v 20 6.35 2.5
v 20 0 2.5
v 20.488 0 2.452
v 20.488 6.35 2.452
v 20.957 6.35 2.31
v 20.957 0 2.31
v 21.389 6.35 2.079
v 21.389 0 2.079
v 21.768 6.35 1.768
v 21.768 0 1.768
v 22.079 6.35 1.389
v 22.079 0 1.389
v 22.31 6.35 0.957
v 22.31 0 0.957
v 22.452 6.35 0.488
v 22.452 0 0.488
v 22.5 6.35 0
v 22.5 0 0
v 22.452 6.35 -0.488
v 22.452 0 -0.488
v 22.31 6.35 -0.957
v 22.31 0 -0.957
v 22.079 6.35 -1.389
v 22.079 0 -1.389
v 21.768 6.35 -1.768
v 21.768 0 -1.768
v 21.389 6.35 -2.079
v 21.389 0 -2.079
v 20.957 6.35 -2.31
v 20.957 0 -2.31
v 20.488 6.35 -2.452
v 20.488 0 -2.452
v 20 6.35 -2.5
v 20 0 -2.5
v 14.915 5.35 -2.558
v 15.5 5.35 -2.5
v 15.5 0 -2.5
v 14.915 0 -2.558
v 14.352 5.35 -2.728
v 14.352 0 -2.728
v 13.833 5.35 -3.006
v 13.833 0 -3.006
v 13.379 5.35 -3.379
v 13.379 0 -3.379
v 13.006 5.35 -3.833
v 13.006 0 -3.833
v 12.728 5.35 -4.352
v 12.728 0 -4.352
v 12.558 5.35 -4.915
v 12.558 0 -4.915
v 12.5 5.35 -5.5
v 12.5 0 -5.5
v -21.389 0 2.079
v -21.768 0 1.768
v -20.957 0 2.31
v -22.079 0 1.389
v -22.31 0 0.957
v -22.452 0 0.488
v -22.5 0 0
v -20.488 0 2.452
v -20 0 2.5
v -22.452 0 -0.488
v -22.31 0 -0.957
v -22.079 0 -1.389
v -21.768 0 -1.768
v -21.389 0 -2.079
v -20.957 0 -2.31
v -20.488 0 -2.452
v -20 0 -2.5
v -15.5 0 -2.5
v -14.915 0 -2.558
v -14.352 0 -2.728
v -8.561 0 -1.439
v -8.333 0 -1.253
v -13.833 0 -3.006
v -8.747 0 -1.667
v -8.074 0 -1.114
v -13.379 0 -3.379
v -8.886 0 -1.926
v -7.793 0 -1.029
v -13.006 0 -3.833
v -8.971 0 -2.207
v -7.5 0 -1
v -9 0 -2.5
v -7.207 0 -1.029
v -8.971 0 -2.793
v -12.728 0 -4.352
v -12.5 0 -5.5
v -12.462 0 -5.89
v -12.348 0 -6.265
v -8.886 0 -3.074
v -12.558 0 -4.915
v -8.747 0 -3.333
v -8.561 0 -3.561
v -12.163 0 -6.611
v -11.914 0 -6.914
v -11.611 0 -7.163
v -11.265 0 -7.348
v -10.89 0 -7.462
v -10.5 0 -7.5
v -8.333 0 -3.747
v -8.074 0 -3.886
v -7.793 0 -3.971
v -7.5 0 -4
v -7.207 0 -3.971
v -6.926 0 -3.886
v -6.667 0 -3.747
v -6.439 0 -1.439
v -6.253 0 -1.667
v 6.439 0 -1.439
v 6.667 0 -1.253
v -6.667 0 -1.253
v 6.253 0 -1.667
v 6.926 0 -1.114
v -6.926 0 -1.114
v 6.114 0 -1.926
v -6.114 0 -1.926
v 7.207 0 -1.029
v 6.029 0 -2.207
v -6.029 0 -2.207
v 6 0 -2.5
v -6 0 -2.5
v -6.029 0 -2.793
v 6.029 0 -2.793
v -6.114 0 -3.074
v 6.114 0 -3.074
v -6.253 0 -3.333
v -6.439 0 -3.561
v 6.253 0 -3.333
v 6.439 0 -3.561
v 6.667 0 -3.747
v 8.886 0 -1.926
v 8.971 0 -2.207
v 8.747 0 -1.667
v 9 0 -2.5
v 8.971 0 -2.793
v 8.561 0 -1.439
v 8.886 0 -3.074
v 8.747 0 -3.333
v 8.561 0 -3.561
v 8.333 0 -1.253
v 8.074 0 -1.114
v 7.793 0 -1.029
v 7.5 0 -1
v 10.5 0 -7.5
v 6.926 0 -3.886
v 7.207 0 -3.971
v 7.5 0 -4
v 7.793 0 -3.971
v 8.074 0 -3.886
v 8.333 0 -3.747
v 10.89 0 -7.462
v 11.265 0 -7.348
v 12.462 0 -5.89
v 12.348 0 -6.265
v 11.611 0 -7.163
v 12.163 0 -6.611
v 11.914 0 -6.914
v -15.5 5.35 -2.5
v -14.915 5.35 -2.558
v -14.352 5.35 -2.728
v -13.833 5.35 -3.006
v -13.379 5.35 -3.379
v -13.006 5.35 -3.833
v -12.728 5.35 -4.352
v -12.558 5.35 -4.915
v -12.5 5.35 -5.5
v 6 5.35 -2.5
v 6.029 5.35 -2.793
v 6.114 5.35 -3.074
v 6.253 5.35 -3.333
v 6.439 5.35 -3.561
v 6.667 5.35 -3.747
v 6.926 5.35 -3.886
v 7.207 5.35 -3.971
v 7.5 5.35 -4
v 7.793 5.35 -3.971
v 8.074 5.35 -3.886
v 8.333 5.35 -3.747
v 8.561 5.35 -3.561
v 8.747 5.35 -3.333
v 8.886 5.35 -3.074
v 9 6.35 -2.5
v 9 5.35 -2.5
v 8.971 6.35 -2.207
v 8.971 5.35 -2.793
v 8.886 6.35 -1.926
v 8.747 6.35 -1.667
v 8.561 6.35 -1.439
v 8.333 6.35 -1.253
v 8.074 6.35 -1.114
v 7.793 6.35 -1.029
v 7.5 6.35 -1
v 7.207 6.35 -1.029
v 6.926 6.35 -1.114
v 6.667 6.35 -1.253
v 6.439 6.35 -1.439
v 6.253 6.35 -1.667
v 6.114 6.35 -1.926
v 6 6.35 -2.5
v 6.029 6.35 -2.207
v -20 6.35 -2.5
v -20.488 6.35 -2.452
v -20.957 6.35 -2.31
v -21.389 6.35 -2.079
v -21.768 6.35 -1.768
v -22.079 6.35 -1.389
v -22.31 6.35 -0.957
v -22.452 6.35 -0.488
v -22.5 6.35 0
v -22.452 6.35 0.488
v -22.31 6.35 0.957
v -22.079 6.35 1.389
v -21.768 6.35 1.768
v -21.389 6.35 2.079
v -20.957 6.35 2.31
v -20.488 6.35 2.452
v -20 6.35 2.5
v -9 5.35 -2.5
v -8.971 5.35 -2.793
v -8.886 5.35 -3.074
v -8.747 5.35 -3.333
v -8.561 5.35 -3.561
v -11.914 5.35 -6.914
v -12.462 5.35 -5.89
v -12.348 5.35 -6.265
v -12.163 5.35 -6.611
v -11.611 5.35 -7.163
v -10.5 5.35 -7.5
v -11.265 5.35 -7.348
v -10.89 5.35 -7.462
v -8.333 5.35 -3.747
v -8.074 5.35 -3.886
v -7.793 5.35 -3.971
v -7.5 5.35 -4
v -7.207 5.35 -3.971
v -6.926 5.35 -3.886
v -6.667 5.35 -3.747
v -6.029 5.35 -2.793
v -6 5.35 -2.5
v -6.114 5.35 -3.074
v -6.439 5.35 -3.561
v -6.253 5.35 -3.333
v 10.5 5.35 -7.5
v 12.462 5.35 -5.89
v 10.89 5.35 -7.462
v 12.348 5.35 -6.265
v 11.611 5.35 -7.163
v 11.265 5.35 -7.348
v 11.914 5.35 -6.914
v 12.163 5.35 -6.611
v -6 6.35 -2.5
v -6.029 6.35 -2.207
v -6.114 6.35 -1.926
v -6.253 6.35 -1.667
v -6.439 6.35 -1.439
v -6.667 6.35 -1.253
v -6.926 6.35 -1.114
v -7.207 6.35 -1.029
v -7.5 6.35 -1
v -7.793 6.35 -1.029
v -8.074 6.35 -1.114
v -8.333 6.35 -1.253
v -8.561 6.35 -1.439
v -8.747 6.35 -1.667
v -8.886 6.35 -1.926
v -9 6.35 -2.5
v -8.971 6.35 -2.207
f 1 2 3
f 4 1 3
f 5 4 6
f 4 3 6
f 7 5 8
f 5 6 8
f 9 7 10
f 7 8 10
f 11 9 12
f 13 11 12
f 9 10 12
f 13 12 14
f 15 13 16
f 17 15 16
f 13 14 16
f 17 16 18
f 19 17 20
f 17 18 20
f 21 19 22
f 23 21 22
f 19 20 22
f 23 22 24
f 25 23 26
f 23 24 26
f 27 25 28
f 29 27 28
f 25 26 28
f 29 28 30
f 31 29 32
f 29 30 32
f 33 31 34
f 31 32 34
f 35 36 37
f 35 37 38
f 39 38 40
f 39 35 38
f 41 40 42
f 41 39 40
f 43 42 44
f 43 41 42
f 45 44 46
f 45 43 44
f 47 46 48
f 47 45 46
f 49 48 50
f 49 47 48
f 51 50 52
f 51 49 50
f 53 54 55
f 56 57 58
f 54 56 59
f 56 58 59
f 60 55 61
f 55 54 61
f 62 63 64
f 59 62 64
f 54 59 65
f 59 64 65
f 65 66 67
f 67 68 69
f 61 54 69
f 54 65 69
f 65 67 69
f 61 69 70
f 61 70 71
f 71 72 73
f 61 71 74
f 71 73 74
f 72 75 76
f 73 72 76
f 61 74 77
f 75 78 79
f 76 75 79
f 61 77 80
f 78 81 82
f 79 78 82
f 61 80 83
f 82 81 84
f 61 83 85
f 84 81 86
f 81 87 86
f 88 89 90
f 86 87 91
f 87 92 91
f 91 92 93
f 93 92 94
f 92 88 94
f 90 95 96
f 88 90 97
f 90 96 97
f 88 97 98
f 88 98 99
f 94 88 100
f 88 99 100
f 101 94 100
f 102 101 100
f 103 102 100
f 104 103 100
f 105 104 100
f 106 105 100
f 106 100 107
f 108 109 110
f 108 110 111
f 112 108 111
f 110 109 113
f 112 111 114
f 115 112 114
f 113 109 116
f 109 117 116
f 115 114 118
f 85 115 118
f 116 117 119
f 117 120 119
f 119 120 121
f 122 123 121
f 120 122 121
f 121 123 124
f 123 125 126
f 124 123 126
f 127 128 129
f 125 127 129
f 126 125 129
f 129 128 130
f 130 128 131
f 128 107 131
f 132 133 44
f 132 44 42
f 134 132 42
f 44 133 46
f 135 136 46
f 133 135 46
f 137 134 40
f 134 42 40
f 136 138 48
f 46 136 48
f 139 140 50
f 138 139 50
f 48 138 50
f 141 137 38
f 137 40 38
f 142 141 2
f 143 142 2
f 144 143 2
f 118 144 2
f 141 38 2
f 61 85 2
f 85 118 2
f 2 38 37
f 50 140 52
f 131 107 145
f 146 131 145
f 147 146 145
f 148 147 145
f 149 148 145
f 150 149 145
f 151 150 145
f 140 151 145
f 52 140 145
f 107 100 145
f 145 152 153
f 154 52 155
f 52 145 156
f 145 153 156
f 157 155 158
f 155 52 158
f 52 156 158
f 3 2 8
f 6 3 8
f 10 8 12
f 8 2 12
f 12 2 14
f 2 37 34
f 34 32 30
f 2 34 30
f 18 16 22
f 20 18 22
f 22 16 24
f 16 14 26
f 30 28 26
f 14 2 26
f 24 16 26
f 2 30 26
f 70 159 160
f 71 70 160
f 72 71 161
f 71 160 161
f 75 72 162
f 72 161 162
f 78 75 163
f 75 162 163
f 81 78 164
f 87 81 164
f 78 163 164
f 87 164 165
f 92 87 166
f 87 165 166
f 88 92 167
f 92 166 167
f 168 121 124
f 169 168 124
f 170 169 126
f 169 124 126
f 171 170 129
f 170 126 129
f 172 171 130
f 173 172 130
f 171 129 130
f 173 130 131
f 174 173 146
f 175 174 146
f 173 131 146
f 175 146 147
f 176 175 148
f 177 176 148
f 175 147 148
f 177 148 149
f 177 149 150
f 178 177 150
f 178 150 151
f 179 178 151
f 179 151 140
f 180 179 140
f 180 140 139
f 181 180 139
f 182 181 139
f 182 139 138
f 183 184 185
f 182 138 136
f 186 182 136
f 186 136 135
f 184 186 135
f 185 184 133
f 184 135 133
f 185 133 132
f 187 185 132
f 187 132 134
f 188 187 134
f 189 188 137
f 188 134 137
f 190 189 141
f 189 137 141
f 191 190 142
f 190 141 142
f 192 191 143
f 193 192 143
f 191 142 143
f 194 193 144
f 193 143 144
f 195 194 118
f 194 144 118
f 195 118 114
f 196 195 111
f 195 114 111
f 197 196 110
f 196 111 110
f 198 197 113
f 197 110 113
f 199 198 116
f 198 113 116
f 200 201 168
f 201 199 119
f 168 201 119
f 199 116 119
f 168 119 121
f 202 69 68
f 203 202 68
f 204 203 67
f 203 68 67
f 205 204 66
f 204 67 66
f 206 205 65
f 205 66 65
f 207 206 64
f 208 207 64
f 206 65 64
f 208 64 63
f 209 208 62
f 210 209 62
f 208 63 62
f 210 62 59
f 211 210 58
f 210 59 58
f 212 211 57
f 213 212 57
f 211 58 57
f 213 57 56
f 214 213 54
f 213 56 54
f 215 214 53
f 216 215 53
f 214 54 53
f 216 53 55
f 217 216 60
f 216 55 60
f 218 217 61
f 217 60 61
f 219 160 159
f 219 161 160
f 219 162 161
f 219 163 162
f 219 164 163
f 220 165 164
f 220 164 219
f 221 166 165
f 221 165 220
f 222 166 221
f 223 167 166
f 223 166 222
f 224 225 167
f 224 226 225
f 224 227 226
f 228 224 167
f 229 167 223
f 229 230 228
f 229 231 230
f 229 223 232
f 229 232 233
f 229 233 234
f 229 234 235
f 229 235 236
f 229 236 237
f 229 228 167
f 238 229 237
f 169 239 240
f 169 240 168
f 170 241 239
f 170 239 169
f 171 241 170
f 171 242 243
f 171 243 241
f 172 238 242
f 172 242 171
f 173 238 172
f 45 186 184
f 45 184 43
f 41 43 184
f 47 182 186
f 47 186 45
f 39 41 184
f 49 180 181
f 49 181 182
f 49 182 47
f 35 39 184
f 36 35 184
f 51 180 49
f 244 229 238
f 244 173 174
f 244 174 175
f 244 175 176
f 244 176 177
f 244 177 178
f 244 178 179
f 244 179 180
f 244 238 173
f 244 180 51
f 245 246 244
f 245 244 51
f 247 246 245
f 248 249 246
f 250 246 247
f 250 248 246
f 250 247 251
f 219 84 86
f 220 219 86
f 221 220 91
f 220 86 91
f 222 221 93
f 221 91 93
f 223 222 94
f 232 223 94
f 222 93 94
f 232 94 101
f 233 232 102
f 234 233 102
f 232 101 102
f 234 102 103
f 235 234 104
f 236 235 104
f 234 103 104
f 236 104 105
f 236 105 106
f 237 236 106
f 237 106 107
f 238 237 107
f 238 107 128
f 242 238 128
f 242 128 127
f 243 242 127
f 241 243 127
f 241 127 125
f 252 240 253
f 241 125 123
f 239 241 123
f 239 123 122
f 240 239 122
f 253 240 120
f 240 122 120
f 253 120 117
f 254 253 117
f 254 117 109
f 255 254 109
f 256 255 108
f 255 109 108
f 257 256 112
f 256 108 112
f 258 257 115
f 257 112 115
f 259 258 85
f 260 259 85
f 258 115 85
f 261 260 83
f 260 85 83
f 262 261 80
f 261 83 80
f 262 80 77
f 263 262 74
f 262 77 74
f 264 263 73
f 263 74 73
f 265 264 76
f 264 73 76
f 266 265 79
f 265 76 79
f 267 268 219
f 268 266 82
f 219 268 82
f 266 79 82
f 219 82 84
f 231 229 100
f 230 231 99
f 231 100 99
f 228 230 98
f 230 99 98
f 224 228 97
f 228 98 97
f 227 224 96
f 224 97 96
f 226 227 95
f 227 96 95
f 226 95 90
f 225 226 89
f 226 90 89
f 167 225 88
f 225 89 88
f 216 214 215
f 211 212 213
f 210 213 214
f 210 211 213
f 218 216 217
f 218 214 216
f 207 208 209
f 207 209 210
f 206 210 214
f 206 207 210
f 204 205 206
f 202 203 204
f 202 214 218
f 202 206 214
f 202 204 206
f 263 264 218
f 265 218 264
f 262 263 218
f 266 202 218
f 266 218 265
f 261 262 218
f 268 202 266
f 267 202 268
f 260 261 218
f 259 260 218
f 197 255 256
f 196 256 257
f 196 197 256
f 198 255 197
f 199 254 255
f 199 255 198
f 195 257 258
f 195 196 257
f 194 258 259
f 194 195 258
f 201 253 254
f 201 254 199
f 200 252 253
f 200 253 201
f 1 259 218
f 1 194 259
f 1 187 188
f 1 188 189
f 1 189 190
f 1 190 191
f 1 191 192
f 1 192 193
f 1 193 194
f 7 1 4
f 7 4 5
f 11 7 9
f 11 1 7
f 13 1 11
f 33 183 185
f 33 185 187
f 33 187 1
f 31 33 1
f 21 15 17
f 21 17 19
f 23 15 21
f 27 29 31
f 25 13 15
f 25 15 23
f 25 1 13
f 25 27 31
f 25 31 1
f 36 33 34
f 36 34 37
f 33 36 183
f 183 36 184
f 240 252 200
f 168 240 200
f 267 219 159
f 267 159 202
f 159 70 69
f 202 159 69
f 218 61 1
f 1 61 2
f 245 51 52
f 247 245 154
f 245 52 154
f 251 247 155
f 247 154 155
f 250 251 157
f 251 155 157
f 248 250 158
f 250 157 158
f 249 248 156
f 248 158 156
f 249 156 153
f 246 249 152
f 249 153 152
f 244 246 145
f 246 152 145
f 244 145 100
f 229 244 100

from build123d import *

# Parameters (mm, degrees)
BOSS_EXTRUDE1_DEPTH         = 6.35
TAP_DRILL_FOR_M4X0_7_TAP1_D = 3
FILLET1_R                   = 3
CUT_EXTRUDE1_START          = -7.5
CUT_EXTRUDE1_OUTLINE_W      = 34
CUT_EXTRUDE1_OUTLINE_H      = 1
CUT_EXTRUDE1_DEPTH          = 5


# Read off the part's stored shape, not the designer's step: Cut-Extrude1
with BuildPart() as part:
    # Sketch1 → Boss-Extrude1 (new body)
    with BuildSketch(Plane(origin=(0, 0, 0), x_dir=(1, 0, 0), z_dir=(0, 1, 0))):
        with BuildLine():
            Line((-20, -2.5), (20, -2.5))
            ThreePointArc((20, -2.5), (22.5, 0), (20, 2.5))
            Line((20, 2.5), (-20, 2.5))
            ThreePointArc((-20, 2.5), (-22.5, 0), (-20, -2.5))
        make_face()
        with BuildLine():
            Line((-12.5, 5.5), (-12.5, 2.5))
            Line((-12.5, 2.5), (12.5, 2.5))
            Line((12.5, 2.5), (12.5, 5.5))
            ThreePointArc((12.5, 5.5), (11.914213562, 6.914213562), (10.5, 7.5))
            Line((10.5, 7.5), (-10.5, 7.5))
            ThreePointArc((-10.5, 7.5), (-11.914213562, 6.914213562), (-12.5, 5.5))
        make_face()
    extrude(amount=BOSS_EXTRUDE1_DEPTH)

    # Tap Drill for M4x0.7 Tap1 (through all)
    with Locations(Plane(origin=(0, 6.35, 0), x_dir=(1, 0, 0), z_dir=(0, 1, 0))):
        with Locations((-7.5, 2.5), (7.5, 2.5)):
            Hole(TAP_DRILL_FOR_M4X0_7_TAP1_D / 2)

    # Fillet1
    fillet1_edges = [part.edges().sort_by_distance(p)[0] for p in [
        (12.5, 3.175, -2.5),
        (-12.5, 3.175, -2.5),
    ]]
    fillet(fillet1_edges, radius=FILLET1_R - 0.0001)  # a hair under: the kernel refuses the full size

    # Cut-Extrude1 outline → Cut-Extrude1 (cut)
    with BuildSketch(Plane.XY.offset(CUT_EXTRUDE1_START)):
        with Locations((0, 5.85)):
            Rectangle(CUT_EXTRUDE1_OUTLINE_W, CUT_EXTRUDE1_OUTLINE_H)
    extrude(amount=CUT_EXTRUDE1_DEPTH, mode=Mode.SUBTRACT)


solid = part.part
